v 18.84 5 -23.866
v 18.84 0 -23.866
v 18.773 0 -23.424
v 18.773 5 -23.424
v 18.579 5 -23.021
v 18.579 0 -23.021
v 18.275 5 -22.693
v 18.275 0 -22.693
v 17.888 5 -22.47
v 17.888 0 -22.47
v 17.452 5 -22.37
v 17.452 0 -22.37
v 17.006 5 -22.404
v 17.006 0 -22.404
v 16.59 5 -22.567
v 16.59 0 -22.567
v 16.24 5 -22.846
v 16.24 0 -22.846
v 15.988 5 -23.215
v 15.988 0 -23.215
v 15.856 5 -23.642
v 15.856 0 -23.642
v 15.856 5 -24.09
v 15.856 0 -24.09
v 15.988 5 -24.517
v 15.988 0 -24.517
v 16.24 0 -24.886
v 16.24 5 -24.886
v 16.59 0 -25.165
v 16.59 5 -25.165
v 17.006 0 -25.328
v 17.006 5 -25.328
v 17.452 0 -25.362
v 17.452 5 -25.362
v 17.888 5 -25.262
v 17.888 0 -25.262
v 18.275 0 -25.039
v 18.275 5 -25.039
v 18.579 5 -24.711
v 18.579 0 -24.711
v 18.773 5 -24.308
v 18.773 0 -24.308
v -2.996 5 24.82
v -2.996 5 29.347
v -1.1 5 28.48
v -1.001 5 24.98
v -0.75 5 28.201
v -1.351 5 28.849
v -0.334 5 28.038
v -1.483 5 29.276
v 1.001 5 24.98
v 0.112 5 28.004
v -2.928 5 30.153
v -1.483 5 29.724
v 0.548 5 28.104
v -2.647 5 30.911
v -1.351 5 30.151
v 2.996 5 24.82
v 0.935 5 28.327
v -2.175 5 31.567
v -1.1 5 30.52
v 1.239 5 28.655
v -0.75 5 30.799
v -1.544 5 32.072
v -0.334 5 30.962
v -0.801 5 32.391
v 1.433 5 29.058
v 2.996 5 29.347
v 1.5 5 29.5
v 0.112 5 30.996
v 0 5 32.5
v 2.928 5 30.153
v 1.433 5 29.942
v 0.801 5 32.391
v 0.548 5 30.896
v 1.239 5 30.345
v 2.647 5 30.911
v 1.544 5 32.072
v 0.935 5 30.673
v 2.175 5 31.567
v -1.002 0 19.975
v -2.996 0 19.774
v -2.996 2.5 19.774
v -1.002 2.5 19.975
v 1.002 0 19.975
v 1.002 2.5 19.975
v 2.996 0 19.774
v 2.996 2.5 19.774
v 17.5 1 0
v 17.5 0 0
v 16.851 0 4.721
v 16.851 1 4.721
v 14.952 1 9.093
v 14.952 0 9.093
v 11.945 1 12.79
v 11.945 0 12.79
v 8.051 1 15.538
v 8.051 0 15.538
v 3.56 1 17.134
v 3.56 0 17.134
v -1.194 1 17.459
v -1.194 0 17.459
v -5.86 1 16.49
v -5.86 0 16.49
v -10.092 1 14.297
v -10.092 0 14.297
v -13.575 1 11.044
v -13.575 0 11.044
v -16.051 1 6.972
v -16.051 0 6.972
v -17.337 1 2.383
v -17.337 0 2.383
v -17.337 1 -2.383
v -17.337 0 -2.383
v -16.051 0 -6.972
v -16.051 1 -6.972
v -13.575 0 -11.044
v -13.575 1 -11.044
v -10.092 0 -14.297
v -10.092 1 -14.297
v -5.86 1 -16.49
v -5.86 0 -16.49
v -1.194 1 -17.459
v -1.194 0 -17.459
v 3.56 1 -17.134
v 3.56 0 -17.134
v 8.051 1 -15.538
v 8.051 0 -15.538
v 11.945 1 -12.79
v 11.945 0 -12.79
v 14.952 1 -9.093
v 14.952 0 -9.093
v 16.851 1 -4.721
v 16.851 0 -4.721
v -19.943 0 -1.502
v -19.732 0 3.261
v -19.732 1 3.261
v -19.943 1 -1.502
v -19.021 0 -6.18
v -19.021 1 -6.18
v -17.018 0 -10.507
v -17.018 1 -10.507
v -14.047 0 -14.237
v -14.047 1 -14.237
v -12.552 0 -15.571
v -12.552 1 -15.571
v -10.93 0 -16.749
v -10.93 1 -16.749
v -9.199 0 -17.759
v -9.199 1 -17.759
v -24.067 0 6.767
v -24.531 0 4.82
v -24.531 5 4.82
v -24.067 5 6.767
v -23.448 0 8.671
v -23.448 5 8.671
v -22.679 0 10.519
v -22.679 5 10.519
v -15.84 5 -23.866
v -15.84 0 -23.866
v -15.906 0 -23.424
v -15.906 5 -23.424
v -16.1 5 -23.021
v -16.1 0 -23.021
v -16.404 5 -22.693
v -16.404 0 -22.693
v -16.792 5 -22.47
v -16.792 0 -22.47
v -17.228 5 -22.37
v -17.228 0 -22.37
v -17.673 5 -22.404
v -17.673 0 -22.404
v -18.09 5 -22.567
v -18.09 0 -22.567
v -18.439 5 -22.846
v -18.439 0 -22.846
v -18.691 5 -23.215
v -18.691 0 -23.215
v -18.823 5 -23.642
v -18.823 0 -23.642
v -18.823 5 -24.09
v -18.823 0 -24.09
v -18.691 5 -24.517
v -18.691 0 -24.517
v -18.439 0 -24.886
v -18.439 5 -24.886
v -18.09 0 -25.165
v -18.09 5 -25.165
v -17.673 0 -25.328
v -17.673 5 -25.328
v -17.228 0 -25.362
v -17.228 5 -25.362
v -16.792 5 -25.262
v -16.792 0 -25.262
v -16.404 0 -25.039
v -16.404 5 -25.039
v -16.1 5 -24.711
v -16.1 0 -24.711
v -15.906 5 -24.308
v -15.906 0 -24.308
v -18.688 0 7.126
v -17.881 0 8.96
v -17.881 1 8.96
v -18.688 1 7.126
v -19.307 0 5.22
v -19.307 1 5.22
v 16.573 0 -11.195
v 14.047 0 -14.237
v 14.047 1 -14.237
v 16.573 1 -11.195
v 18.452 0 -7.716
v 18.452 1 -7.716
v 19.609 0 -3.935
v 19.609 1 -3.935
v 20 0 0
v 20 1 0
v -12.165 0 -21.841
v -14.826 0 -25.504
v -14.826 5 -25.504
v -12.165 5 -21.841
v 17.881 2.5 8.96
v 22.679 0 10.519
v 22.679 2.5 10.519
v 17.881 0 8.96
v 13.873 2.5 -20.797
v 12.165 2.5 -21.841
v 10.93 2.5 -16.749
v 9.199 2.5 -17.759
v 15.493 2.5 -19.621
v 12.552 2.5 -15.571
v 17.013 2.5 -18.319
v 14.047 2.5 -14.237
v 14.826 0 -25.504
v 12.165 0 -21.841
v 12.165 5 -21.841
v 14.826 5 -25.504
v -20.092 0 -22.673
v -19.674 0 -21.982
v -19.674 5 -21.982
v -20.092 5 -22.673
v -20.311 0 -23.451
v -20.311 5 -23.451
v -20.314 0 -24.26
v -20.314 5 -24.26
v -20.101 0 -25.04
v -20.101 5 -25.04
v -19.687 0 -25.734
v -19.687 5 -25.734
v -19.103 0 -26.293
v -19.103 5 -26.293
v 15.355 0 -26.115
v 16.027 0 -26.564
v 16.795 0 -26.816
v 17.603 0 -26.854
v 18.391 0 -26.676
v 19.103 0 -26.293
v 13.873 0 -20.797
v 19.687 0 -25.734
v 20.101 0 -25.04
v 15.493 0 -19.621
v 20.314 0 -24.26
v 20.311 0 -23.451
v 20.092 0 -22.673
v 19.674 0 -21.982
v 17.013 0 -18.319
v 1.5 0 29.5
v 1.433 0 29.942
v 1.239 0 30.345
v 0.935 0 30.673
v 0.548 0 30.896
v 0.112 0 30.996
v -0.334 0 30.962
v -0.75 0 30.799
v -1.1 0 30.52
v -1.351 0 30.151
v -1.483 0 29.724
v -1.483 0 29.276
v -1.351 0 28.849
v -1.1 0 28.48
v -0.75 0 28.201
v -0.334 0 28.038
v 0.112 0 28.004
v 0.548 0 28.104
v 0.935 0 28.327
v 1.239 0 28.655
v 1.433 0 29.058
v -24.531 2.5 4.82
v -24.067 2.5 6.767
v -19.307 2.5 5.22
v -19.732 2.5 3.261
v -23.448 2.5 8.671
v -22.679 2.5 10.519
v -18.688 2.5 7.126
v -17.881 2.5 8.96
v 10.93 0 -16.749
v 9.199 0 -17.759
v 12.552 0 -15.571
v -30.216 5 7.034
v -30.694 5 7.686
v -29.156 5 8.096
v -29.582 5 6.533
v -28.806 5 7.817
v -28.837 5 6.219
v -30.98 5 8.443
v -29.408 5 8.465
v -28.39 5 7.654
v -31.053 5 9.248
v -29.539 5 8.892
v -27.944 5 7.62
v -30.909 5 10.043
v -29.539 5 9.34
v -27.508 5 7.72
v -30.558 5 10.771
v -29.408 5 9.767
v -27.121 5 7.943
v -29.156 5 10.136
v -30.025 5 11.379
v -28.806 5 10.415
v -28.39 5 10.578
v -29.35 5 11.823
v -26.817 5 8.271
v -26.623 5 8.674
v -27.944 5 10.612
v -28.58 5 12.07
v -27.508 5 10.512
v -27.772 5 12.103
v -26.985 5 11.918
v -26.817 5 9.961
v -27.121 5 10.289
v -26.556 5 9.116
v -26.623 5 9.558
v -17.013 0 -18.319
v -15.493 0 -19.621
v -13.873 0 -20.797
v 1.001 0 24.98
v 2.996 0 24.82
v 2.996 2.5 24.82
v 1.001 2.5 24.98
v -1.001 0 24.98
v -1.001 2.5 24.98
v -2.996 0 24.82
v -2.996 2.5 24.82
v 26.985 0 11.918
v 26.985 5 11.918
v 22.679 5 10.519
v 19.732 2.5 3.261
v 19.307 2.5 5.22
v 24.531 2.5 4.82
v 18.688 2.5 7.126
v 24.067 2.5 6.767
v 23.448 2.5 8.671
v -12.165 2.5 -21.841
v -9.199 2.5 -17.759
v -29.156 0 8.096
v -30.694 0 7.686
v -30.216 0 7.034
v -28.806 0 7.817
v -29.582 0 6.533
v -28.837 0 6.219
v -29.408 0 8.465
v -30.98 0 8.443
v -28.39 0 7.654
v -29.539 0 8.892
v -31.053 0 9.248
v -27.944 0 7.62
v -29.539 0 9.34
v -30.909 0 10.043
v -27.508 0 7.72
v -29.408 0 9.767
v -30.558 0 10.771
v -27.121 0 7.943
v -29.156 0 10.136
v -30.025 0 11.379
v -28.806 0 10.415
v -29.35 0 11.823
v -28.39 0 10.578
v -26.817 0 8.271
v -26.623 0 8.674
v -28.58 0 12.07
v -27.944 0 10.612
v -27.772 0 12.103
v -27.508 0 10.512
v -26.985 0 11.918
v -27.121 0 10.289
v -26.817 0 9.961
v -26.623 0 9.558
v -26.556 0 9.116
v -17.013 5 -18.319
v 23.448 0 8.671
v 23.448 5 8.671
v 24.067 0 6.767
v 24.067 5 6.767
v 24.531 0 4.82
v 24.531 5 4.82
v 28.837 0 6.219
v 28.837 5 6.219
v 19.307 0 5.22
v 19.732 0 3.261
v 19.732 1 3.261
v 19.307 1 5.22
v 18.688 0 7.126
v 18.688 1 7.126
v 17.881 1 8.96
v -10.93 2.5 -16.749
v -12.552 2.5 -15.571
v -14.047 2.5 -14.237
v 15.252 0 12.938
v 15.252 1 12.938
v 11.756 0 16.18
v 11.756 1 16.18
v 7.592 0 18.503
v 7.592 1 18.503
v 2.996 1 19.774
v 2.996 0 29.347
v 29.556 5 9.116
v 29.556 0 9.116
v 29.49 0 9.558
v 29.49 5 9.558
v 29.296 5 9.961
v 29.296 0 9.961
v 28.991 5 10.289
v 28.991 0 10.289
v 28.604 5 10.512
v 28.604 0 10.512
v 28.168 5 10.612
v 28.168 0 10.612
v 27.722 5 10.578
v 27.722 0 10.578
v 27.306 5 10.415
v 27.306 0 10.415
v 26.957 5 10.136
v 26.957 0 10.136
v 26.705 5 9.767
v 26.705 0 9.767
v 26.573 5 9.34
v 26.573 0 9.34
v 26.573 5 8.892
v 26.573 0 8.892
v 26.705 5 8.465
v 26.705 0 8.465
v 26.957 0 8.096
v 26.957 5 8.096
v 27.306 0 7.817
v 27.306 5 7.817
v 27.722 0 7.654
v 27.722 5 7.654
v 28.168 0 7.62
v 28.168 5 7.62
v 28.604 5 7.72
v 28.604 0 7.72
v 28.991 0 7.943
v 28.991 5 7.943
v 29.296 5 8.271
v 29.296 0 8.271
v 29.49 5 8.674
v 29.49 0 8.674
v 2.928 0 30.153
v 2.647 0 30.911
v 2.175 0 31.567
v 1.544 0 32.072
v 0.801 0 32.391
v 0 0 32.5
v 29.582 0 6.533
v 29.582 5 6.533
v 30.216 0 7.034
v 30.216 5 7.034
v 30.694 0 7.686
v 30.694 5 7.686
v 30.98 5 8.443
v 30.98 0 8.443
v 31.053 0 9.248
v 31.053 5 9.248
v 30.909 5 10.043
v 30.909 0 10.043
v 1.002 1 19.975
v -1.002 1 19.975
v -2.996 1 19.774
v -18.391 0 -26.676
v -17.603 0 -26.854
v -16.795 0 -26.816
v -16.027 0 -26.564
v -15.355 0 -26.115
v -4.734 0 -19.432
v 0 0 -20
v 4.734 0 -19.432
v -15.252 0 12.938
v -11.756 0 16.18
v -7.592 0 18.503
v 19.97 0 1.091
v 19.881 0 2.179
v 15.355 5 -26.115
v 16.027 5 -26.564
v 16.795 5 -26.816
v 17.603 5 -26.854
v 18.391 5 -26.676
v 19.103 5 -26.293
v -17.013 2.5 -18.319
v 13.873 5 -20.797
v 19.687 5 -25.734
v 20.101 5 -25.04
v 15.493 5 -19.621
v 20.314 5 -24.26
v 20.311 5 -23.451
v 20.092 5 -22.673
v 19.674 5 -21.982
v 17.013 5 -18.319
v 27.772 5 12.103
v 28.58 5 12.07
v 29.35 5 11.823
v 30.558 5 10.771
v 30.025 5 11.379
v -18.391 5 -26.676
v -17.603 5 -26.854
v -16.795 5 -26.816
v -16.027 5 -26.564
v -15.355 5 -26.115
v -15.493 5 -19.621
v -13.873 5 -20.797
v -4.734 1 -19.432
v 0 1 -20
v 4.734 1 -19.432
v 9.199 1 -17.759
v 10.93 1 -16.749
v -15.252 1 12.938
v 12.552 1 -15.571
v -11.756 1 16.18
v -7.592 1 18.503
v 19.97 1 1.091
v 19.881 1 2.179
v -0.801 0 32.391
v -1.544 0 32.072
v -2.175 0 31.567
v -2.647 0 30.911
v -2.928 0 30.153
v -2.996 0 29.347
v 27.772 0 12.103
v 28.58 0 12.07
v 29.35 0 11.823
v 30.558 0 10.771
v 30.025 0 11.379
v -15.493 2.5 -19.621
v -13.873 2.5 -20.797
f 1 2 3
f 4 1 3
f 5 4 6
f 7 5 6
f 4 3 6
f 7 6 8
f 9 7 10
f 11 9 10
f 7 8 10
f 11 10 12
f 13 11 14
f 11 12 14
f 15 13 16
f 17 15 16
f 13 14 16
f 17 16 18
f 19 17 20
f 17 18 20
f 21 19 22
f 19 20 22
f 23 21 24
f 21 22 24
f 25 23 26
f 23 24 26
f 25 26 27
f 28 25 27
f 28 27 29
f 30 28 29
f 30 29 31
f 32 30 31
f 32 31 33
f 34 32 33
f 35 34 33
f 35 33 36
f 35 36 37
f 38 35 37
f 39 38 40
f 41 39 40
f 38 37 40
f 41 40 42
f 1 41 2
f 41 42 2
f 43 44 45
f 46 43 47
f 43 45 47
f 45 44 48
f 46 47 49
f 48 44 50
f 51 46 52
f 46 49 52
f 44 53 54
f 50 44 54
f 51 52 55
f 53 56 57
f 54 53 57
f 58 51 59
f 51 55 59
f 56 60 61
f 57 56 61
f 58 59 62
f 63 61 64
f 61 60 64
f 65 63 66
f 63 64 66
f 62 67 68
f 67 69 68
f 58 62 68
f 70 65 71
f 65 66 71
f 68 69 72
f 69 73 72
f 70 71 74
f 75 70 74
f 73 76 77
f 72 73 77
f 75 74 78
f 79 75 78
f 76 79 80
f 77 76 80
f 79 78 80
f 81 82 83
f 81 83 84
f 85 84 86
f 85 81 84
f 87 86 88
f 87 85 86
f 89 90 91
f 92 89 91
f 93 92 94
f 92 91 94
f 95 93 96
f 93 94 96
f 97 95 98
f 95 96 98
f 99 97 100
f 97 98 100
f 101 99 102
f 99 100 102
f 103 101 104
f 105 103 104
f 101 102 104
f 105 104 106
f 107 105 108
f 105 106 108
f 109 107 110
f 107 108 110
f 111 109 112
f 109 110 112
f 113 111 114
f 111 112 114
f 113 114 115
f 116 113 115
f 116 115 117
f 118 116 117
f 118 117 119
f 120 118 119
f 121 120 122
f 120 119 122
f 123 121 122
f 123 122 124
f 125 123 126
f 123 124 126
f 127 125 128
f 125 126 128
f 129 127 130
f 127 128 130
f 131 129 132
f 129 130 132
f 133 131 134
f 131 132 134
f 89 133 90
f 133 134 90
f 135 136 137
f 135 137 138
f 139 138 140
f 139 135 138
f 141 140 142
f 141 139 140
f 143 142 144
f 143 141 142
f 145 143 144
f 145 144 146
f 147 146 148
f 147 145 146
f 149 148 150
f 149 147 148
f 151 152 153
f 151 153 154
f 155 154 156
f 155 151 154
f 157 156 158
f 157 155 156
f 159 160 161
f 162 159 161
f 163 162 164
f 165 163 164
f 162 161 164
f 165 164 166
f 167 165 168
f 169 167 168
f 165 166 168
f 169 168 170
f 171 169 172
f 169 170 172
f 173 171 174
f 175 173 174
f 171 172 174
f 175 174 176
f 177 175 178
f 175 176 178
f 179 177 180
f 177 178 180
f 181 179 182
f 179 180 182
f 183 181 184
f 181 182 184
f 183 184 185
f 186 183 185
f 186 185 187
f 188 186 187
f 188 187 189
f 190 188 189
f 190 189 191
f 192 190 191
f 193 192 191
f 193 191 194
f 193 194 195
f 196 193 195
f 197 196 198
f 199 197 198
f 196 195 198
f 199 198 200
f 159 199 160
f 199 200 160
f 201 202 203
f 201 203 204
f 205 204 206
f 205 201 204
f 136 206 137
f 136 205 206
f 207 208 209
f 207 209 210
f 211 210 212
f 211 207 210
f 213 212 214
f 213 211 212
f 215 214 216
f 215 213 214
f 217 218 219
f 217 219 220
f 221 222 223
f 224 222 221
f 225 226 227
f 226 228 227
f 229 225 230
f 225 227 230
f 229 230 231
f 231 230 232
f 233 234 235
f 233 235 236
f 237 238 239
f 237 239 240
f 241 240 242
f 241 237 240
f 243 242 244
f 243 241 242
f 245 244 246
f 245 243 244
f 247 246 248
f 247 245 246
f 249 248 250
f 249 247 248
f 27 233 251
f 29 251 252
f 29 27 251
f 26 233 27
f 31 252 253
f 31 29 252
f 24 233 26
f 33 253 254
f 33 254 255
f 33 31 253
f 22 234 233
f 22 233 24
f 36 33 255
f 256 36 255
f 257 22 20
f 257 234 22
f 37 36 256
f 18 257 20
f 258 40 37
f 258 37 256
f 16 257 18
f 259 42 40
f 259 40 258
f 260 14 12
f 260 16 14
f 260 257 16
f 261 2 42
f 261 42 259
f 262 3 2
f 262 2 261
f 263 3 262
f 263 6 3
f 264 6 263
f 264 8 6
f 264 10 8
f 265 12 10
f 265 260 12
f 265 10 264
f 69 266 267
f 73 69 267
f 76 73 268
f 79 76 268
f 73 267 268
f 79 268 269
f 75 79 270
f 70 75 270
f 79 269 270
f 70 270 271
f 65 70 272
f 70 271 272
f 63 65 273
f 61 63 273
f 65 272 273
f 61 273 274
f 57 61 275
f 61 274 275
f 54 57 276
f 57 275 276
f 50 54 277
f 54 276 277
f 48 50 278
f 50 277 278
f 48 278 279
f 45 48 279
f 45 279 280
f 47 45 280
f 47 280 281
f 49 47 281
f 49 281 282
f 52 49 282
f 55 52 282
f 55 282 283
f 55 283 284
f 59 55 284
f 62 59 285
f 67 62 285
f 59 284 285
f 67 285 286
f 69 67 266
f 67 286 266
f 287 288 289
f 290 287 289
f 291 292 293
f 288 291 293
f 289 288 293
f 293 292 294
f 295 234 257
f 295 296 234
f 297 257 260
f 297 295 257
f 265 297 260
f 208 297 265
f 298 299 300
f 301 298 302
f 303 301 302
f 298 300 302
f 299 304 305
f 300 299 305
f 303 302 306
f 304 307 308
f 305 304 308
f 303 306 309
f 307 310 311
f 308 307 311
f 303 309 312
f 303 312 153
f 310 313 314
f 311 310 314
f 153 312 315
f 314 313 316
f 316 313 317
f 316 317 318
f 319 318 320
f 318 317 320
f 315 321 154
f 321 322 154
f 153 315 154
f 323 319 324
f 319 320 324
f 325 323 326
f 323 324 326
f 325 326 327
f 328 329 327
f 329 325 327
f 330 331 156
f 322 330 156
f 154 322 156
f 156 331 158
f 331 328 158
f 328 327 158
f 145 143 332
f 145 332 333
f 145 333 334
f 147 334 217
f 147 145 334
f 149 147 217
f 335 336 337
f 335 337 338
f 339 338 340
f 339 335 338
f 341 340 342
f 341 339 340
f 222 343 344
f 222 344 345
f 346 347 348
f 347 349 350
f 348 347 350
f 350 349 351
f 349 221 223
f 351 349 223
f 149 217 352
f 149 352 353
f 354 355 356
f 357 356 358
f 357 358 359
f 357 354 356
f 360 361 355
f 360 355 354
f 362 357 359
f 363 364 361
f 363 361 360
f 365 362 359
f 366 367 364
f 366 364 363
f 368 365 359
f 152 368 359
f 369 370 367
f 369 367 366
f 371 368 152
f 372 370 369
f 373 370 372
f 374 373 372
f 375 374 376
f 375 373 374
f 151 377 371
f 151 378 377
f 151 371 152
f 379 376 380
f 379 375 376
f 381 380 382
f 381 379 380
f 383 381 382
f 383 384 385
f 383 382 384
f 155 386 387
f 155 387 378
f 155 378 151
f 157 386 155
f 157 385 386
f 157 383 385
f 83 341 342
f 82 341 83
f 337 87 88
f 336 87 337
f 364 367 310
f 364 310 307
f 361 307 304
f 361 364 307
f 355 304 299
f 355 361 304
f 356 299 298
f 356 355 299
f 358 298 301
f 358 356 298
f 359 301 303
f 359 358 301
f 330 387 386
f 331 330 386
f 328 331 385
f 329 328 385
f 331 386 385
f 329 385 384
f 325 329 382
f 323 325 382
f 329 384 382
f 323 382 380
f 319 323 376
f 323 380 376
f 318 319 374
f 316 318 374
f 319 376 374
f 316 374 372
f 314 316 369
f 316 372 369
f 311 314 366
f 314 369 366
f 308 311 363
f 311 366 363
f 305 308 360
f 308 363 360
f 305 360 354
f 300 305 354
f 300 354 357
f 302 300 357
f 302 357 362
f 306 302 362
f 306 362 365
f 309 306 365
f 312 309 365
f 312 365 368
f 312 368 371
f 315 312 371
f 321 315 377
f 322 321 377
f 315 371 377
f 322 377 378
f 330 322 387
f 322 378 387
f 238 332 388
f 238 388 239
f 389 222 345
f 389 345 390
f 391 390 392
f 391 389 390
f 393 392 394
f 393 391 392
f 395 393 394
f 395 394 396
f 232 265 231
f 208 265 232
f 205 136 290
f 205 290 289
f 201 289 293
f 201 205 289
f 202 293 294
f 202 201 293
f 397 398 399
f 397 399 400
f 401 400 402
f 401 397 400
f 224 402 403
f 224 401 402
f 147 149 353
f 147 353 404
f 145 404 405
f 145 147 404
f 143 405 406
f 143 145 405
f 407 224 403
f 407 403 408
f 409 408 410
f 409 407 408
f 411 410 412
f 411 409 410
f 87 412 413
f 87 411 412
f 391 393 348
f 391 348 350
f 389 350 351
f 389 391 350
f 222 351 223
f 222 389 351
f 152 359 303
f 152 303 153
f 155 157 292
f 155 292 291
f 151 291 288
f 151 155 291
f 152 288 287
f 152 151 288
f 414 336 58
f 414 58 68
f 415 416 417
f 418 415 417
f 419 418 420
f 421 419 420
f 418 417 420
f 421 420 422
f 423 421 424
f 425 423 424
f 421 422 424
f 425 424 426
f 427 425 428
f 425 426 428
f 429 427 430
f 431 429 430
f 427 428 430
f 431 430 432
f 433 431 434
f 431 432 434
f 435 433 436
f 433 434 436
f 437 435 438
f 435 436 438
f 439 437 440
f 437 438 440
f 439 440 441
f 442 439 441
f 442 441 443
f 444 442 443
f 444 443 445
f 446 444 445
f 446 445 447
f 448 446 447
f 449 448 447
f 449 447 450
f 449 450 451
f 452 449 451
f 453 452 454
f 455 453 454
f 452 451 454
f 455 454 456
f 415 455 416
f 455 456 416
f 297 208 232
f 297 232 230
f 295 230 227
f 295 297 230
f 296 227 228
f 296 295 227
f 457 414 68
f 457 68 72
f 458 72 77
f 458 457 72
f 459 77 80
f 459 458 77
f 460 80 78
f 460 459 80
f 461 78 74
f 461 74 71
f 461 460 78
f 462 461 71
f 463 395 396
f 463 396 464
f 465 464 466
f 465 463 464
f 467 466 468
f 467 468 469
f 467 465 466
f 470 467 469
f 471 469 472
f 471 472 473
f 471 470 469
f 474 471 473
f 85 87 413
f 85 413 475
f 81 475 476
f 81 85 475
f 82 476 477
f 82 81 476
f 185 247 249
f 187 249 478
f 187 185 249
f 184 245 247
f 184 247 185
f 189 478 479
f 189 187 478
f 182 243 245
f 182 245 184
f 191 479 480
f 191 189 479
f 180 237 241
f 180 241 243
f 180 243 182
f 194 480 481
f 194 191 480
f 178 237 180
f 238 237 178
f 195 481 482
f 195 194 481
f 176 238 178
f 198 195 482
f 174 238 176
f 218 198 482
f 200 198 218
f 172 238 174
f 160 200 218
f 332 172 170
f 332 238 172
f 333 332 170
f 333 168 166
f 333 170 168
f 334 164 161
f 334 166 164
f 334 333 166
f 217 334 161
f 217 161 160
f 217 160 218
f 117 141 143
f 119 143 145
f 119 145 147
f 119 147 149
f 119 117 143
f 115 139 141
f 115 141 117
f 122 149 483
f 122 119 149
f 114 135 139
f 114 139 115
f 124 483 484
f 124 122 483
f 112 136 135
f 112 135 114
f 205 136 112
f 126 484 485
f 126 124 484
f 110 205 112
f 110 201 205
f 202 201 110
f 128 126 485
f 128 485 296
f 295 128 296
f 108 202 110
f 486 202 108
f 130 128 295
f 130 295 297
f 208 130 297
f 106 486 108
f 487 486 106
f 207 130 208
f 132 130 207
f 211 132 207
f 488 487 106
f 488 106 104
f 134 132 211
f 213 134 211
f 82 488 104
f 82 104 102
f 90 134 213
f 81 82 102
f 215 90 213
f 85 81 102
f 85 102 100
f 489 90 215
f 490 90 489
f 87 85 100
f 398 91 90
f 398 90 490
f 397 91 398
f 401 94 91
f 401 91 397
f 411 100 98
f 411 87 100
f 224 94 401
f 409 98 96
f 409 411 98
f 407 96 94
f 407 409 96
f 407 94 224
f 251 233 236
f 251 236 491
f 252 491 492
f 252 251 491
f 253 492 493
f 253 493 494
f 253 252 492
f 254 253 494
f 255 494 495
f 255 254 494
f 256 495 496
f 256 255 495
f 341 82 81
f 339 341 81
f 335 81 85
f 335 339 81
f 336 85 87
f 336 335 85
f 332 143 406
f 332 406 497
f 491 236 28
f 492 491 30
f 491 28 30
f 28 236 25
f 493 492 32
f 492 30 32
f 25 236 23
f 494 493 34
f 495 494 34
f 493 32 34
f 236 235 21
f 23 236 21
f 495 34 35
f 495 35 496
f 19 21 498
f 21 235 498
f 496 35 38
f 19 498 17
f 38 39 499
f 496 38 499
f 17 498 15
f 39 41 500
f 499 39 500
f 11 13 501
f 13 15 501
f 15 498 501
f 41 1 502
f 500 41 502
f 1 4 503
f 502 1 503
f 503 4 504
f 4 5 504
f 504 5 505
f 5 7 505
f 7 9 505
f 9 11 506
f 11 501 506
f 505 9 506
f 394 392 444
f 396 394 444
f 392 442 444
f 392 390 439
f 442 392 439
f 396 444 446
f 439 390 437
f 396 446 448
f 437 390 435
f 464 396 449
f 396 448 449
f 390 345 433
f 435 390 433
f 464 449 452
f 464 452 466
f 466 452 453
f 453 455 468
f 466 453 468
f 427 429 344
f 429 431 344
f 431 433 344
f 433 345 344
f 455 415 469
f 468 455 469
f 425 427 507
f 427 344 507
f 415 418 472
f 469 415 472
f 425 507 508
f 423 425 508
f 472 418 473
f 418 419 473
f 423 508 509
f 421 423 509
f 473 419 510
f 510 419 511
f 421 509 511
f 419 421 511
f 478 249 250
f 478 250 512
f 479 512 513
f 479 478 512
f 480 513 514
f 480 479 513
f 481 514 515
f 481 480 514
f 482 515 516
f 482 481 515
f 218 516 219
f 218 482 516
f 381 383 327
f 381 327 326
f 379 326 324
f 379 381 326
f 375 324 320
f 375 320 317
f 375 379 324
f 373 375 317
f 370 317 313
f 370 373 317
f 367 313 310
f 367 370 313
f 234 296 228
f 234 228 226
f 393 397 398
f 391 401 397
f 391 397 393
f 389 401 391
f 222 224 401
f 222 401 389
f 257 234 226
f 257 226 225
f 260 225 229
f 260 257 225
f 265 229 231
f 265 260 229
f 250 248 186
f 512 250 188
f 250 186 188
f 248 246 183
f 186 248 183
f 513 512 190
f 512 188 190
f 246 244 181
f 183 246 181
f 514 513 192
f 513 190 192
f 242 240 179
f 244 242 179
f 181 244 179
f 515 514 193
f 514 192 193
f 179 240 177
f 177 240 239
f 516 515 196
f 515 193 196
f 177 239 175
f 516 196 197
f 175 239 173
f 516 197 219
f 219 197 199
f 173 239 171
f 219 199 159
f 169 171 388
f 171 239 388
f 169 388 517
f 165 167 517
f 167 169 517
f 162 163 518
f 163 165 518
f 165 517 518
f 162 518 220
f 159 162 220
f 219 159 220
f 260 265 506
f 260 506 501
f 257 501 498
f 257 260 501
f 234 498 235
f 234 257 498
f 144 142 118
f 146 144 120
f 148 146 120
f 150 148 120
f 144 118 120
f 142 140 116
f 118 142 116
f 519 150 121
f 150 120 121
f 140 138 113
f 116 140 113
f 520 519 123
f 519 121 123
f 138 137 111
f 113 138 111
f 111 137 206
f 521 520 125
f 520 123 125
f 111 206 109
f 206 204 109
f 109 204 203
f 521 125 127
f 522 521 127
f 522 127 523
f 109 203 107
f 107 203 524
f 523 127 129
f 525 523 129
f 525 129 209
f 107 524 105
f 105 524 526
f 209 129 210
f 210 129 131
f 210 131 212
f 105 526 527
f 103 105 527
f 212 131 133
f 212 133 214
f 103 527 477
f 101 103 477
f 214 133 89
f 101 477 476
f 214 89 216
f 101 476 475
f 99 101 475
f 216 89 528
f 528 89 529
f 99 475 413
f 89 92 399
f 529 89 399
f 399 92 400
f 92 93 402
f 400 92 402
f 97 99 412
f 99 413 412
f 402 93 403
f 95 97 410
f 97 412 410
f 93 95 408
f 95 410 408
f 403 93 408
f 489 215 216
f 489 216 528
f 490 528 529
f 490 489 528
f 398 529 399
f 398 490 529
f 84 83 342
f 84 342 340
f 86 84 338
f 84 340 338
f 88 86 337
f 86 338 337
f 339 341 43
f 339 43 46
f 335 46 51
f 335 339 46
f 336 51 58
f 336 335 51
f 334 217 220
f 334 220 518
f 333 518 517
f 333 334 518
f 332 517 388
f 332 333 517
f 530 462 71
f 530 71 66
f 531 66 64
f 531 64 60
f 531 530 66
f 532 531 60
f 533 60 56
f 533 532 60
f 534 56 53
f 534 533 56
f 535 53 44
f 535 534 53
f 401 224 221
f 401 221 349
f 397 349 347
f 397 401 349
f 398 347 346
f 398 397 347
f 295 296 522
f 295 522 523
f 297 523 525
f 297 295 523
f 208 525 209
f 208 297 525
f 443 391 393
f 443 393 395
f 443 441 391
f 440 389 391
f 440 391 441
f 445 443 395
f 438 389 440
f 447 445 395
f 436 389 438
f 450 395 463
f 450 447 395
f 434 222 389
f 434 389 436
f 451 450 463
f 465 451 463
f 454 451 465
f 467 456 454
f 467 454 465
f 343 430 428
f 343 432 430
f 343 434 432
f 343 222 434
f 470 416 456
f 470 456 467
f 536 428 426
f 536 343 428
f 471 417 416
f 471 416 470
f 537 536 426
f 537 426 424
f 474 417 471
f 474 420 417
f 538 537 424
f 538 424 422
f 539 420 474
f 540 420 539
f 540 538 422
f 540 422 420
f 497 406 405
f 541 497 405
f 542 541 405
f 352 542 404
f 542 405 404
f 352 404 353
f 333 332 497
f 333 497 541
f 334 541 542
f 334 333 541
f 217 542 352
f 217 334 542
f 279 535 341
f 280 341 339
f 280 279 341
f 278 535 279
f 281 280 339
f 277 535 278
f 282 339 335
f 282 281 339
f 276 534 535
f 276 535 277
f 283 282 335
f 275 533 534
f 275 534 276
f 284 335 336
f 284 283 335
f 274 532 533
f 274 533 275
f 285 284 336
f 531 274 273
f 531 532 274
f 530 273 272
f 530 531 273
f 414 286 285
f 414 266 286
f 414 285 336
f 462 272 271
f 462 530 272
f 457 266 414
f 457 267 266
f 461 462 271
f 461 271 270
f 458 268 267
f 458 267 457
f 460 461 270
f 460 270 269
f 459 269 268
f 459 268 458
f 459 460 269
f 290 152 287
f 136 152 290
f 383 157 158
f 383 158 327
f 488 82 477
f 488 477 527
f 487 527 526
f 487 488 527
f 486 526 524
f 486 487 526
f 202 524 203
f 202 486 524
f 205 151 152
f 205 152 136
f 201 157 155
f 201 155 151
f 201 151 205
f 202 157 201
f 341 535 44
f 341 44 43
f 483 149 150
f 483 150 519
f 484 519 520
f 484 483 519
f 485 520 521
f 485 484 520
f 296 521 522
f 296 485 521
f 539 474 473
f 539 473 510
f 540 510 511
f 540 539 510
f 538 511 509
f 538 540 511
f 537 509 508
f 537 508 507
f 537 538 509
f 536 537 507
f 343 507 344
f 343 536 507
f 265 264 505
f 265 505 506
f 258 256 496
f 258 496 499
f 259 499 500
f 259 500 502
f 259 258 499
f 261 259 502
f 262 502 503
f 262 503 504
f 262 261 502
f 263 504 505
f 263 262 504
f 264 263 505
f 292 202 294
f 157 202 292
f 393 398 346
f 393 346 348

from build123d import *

# Parameters (mm, degrees)
F0_R     = 1.5
F1_DEPTH = 5
F0_R_2   = 17.5
F2_DEPTH = 1
F3_DEPTH = 2.5


with BuildPart() as f1:
    # F0 (on Front) → F1 (new body)
    with BuildSketch(Plane.XZ):
        with BuildLine():
            ThreePointArc((-26.9852390339, 11.9183419267), (-29.3497180345, 11.8227939597), (-30.909336738, 10.0430524452))
            ThreePointArc((-30.909336738, 10.0430524452), (-30.6936846646, 7.6864903037), (-28.836942592, 6.2193843702))
            Line((-28.836942592, 6.2193843702), (-24.5308995747, 4.8202661811))
            ThreePointArc((-24.5308995747, 4.8202661811), (-23.7764129074, 7.7254248594), (-22.6791960166, 10.5192237376))
            Line((-22.6791960166, 10.5192237376), (-26.9852390339, 11.9183419267))
        make_face()
        with Locations((-28.0561672307, 9.1160013341)):
            Circle(F0_R, mode=Mode.SUBTRACT)
    extrude(amount=-F1_DEPTH)


with BuildPart() as f1b:
    # F0 (on Front) → F1, piece 2 (new body)
    with BuildSketch(Plane.XZ):
        with BuildLine():
            Line((2.9961192941, 24.8198160585), (2.9961192941, 29.3474576271))
            ThreePointArc((2.9961192941, 29.3474576271), (2.174583537, 31.5666848915), (0, 32.5))
            ThreePointArc((0, 32.5), (-2.174583537, 31.5666848915), (-2.9961192941, 29.3474576271))
            Line((-2.9961192941, 29.3474576271), (-2.9961192941, 24.8198160585))
            ThreePointArc((-2.9961192941, 24.8198160585), (0, 25), (2.9961192941, 24.8198160585))
        make_face()
        with Locations((0, 29.5)):
            Circle(F0_R, mode=Mode.SUBTRACT)
    extrude(amount=-F1_DEPTH)


with BuildPart() as f1c:
    # F0 (on Front) → F1, piece 3 (new body)
    with BuildSketch(Plane.XZ):
        with BuildLine():
            ThreePointArc((28.836942592, 6.2193843702), (30.6936846628, 7.6864903005), (30.9093367402, 10.0430524383))
            ThreePointArc((30.9093367402, 10.0430524383), (29.3497180378, 11.8227939581), (26.9852390339, 11.9183419267))
            Line((26.9852390339, 11.9183419267), (22.6791960166, 10.5192237376))
            ThreePointArc((22.6791960166, 10.5192237376), (23.7764129074, 7.7254248594), (24.5308995747, 4.8202661811))
            Line((24.5308995747, 4.8202661811), (28.836942592, 6.2193843702))
        make_face()
        with Locations((28.0561672307, 9.1160013341)):
            Circle(F0_R, mode=Mode.SUBTRACT)
    extrude(amount=-F1_DEPTH)


with BuildPart() as f1d:
    # F0 (on Front) → F1, piece 4 (new body)
    with BuildSketch(Plane.XZ):
        with BuildLine():
            ThreePointArc((14.8260913594, -25.5036666972), (16.7951568352, -26.8161726716), (19.1030207478, -26.2930522821))
            ThreePointArc((19.1030207478, -26.2930522821), (20.313706884, -24.2597963708), (19.6739142116, -21.9815172269))
            Line((19.6739142116, -21.9815172269), (17.0126332699, -18.3185782534))
            ThreePointArc((17.0126332699, -18.3185782534), (14.6946313073, -20.2254248594), (12.1648104177, -21.8407277237))
            Line((12.1648104177, -21.8407277237), (14.8260913594, -25.5036666972))
        make_face()
        with Locations((17.3396649426, -23.8660013341)):
            Circle(F0_R, mode=Mode.SUBTRACT)
    extrude(amount=-F1_DEPTH)


with BuildPart() as f1e:
    # F0 (on Front) → F1, piece 5 (new body)
    with BuildSketch(Plane.XZ):
        with BuildLine():
            ThreePointArc((-19.6739142116, -21.9815172269), (-20.3137068702, -24.259796475), (-19.1030205777, -26.2930524057))
            ThreePointArc((-19.1030205777, -26.2930524057), (-16.7951567318, -26.8161726525), (-14.8260913594, -25.5036666972))
            Line((-14.8260913594, -25.5036666972), (-12.1648104177, -21.8407277237))
            ThreePointArc((-12.1648104177, -21.8407277237), (-14.6946313073, -20.2254248594), (-17.0126332699, -18.3185782534))
            Line((-17.0126332699, -18.3185782534), (-19.6739142116, -21.9815172269))
        make_face()
        with Locations((-17.3396649426, -23.8660013341)):
            Circle(F0_R, mode=Mode.SUBTRACT)
    extrude(amount=-F1_DEPTH)


with BuildPart() as f2:
    # F0 (on Front) → F2 (new body)
    with BuildSketch(Plane.XZ):
        with BuildLine():
            ThreePointArc((17.8806329953, 8.9600760983), (11.7557050458, 16.1803398875), (2.9961192941, 19.7743083109))
            ThreePointArc((2.9961192941, 19.7743083109), (0, 20), (-2.9961192941, 19.7743083109))
            ThreePointArc((-2.9961192941, 19.7743083109), (-11.7557050458, 16.1803398875), (-17.8806329953, 8.9600760983))
            ThreePointArc((-17.8806329953, 8.9600760983), (-19.0211303259, 6.1803398875), (-19.7323365534, 3.2611185418))
            ThreePointArc((-19.7323365534, 3.2611185418), (-19.0211303259, -6.1803398875), (-14.0469582255, -14.2366767404))
            ThreePointArc((-14.0469582255, -14.2366767404), (-11.7557050458, -16.1803398875), (-9.1991353733, -17.7588262107))
            ThreePointArc((-9.1991353733, -17.7588262107), (0, -20), (9.1991353733, -17.7588262107))
            ThreePointArc((9.1991353733, -17.7588262107), (11.7557050458, -16.1803398875), (14.0469582255, -14.2366767404))
            ThreePointArc((14.0469582255, -14.2366767404), (18.4518178577, -7.7155957479), (20, 0))
            ThreePointArc((20, 0), (19.9329718189, 1.636042318), (19.7323365534, 3.2611185418))
            ThreePointArc((19.7323365534, 3.2611185418), (19.0211303259, 6.1803398875), (17.8806329953, 8.9600760983))
        make_face()
        Circle(F0_R_2, mode=Mode.SUBTRACT)
    extrude(amount=-F2_DEPTH)


with BuildPart() as f3:
    # F0 (on Front) → F3 (new body)
    with BuildSketch(Plane.XZ):
        with BuildLine():
            Line((-14.0469582255, -14.2366767404), (-17.0126332699, -18.3185782534))
            ThreePointArc((-17.0126332699, -18.3185782534), (-14.6946313073, -20.2254248594), (-12.1648104177, -21.8407277237))
            Line((-12.1648104177, -21.8407277237), (-9.1991353733, -17.7588262107))
            ThreePointArc((-9.1991353733, -17.7588262107), (-11.7557050458, -16.1803398875), (-14.0469582255, -14.2366767404))
        make_face()
    extrude(amount=-F3_DEPTH)


with BuildPart() as f3b:
    # F0 (on Front) → F3, piece 2 (new body)
    with BuildSketch(Plane.XZ):
        with BuildLine():
            Line((-17.8806329953, 8.9600760983), (-22.6791960166, 10.5192237376))
            ThreePointArc((-22.6791960166, 10.5192237376), (-23.7764129074, 7.7254248594), (-24.5308995747, 4.8202661811))
            Line((-24.5308995747, 4.8202661811), (-19.7323365534, 3.2611185418))
            ThreePointArc((-19.7323365534, 3.2611185418), (-19.0211303259, 6.1803398875), (-17.8806329953, 8.9600760983))
        make_face()
    extrude(amount=-F3_DEPTH)


with BuildPart() as f3c:
    # F0 (on Front) → F3, piece 3 (new body)
    with BuildSketch(Plane.XZ):
        with BuildLine():
            Line((2.9961192941, 19.7743083109), (2.9961192941, 24.8198160585))
            ThreePointArc((2.9961192941, 24.8198160585), (0, 25), (-2.9961192941, 24.8198160585))
            Line((-2.9961192941, 24.8198160585), (-2.9961192941, 19.7743083109))
            ThreePointArc((-2.9961192941, 19.7743083109), (0, 20), (2.9961192941, 19.7743083109))
        make_face()
    extrude(amount=-F3_DEPTH)


with BuildPart() as f3d:
    # F0 (on Front) → F3, piece 4 (new body)
    with BuildSketch(Plane.XZ):
        with BuildLine():
            ThreePointArc((24.5308995747, 4.8202661811), (23.7764129074, 7.7254248594), (22.6791960166, 10.5192237376))
            Line((22.6791960166, 10.5192237376), (17.8806329953, 8.9600760983))
            ThreePointArc((17.8806329953, 8.9600760983), (19.0211303259, 6.1803398875), (19.7323365534, 3.2611185418))
            Line((19.7323365534, 3.2611185418), (24.5308995747, 4.8202661811))
        make_face()
    extrude(amount=-F3_DEPTH)


with BuildPart() as f3e:
    # F0 (on Front) → F3, piece 5 (new body)
    with BuildSketch(Plane.XZ):
        with BuildLine():
            ThreePointArc((12.1648104177, -21.8407277237), (14.6946313073, -20.2254248594), (17.0126332699, -18.3185782534))
            Line((17.0126332699, -18.3185782534), (14.0469582255, -14.2366767404))
            ThreePointArc((14.0469582255, -14.2366767404), (11.7557050458, -16.1803398875), (9.1991353733, -17.7588262107))
            Line((9.1991353733, -17.7588262107), (12.1648104177, -21.8407277237))
        make_face()
    extrude(amount=-F3_DEPTH)


solid = Compound([f1.part, f1b.part, f1c.part, f1d.part, f1e.part, f2.part, f3.part, f3b.part, f3c.part, f3d.part, f3e.part])
